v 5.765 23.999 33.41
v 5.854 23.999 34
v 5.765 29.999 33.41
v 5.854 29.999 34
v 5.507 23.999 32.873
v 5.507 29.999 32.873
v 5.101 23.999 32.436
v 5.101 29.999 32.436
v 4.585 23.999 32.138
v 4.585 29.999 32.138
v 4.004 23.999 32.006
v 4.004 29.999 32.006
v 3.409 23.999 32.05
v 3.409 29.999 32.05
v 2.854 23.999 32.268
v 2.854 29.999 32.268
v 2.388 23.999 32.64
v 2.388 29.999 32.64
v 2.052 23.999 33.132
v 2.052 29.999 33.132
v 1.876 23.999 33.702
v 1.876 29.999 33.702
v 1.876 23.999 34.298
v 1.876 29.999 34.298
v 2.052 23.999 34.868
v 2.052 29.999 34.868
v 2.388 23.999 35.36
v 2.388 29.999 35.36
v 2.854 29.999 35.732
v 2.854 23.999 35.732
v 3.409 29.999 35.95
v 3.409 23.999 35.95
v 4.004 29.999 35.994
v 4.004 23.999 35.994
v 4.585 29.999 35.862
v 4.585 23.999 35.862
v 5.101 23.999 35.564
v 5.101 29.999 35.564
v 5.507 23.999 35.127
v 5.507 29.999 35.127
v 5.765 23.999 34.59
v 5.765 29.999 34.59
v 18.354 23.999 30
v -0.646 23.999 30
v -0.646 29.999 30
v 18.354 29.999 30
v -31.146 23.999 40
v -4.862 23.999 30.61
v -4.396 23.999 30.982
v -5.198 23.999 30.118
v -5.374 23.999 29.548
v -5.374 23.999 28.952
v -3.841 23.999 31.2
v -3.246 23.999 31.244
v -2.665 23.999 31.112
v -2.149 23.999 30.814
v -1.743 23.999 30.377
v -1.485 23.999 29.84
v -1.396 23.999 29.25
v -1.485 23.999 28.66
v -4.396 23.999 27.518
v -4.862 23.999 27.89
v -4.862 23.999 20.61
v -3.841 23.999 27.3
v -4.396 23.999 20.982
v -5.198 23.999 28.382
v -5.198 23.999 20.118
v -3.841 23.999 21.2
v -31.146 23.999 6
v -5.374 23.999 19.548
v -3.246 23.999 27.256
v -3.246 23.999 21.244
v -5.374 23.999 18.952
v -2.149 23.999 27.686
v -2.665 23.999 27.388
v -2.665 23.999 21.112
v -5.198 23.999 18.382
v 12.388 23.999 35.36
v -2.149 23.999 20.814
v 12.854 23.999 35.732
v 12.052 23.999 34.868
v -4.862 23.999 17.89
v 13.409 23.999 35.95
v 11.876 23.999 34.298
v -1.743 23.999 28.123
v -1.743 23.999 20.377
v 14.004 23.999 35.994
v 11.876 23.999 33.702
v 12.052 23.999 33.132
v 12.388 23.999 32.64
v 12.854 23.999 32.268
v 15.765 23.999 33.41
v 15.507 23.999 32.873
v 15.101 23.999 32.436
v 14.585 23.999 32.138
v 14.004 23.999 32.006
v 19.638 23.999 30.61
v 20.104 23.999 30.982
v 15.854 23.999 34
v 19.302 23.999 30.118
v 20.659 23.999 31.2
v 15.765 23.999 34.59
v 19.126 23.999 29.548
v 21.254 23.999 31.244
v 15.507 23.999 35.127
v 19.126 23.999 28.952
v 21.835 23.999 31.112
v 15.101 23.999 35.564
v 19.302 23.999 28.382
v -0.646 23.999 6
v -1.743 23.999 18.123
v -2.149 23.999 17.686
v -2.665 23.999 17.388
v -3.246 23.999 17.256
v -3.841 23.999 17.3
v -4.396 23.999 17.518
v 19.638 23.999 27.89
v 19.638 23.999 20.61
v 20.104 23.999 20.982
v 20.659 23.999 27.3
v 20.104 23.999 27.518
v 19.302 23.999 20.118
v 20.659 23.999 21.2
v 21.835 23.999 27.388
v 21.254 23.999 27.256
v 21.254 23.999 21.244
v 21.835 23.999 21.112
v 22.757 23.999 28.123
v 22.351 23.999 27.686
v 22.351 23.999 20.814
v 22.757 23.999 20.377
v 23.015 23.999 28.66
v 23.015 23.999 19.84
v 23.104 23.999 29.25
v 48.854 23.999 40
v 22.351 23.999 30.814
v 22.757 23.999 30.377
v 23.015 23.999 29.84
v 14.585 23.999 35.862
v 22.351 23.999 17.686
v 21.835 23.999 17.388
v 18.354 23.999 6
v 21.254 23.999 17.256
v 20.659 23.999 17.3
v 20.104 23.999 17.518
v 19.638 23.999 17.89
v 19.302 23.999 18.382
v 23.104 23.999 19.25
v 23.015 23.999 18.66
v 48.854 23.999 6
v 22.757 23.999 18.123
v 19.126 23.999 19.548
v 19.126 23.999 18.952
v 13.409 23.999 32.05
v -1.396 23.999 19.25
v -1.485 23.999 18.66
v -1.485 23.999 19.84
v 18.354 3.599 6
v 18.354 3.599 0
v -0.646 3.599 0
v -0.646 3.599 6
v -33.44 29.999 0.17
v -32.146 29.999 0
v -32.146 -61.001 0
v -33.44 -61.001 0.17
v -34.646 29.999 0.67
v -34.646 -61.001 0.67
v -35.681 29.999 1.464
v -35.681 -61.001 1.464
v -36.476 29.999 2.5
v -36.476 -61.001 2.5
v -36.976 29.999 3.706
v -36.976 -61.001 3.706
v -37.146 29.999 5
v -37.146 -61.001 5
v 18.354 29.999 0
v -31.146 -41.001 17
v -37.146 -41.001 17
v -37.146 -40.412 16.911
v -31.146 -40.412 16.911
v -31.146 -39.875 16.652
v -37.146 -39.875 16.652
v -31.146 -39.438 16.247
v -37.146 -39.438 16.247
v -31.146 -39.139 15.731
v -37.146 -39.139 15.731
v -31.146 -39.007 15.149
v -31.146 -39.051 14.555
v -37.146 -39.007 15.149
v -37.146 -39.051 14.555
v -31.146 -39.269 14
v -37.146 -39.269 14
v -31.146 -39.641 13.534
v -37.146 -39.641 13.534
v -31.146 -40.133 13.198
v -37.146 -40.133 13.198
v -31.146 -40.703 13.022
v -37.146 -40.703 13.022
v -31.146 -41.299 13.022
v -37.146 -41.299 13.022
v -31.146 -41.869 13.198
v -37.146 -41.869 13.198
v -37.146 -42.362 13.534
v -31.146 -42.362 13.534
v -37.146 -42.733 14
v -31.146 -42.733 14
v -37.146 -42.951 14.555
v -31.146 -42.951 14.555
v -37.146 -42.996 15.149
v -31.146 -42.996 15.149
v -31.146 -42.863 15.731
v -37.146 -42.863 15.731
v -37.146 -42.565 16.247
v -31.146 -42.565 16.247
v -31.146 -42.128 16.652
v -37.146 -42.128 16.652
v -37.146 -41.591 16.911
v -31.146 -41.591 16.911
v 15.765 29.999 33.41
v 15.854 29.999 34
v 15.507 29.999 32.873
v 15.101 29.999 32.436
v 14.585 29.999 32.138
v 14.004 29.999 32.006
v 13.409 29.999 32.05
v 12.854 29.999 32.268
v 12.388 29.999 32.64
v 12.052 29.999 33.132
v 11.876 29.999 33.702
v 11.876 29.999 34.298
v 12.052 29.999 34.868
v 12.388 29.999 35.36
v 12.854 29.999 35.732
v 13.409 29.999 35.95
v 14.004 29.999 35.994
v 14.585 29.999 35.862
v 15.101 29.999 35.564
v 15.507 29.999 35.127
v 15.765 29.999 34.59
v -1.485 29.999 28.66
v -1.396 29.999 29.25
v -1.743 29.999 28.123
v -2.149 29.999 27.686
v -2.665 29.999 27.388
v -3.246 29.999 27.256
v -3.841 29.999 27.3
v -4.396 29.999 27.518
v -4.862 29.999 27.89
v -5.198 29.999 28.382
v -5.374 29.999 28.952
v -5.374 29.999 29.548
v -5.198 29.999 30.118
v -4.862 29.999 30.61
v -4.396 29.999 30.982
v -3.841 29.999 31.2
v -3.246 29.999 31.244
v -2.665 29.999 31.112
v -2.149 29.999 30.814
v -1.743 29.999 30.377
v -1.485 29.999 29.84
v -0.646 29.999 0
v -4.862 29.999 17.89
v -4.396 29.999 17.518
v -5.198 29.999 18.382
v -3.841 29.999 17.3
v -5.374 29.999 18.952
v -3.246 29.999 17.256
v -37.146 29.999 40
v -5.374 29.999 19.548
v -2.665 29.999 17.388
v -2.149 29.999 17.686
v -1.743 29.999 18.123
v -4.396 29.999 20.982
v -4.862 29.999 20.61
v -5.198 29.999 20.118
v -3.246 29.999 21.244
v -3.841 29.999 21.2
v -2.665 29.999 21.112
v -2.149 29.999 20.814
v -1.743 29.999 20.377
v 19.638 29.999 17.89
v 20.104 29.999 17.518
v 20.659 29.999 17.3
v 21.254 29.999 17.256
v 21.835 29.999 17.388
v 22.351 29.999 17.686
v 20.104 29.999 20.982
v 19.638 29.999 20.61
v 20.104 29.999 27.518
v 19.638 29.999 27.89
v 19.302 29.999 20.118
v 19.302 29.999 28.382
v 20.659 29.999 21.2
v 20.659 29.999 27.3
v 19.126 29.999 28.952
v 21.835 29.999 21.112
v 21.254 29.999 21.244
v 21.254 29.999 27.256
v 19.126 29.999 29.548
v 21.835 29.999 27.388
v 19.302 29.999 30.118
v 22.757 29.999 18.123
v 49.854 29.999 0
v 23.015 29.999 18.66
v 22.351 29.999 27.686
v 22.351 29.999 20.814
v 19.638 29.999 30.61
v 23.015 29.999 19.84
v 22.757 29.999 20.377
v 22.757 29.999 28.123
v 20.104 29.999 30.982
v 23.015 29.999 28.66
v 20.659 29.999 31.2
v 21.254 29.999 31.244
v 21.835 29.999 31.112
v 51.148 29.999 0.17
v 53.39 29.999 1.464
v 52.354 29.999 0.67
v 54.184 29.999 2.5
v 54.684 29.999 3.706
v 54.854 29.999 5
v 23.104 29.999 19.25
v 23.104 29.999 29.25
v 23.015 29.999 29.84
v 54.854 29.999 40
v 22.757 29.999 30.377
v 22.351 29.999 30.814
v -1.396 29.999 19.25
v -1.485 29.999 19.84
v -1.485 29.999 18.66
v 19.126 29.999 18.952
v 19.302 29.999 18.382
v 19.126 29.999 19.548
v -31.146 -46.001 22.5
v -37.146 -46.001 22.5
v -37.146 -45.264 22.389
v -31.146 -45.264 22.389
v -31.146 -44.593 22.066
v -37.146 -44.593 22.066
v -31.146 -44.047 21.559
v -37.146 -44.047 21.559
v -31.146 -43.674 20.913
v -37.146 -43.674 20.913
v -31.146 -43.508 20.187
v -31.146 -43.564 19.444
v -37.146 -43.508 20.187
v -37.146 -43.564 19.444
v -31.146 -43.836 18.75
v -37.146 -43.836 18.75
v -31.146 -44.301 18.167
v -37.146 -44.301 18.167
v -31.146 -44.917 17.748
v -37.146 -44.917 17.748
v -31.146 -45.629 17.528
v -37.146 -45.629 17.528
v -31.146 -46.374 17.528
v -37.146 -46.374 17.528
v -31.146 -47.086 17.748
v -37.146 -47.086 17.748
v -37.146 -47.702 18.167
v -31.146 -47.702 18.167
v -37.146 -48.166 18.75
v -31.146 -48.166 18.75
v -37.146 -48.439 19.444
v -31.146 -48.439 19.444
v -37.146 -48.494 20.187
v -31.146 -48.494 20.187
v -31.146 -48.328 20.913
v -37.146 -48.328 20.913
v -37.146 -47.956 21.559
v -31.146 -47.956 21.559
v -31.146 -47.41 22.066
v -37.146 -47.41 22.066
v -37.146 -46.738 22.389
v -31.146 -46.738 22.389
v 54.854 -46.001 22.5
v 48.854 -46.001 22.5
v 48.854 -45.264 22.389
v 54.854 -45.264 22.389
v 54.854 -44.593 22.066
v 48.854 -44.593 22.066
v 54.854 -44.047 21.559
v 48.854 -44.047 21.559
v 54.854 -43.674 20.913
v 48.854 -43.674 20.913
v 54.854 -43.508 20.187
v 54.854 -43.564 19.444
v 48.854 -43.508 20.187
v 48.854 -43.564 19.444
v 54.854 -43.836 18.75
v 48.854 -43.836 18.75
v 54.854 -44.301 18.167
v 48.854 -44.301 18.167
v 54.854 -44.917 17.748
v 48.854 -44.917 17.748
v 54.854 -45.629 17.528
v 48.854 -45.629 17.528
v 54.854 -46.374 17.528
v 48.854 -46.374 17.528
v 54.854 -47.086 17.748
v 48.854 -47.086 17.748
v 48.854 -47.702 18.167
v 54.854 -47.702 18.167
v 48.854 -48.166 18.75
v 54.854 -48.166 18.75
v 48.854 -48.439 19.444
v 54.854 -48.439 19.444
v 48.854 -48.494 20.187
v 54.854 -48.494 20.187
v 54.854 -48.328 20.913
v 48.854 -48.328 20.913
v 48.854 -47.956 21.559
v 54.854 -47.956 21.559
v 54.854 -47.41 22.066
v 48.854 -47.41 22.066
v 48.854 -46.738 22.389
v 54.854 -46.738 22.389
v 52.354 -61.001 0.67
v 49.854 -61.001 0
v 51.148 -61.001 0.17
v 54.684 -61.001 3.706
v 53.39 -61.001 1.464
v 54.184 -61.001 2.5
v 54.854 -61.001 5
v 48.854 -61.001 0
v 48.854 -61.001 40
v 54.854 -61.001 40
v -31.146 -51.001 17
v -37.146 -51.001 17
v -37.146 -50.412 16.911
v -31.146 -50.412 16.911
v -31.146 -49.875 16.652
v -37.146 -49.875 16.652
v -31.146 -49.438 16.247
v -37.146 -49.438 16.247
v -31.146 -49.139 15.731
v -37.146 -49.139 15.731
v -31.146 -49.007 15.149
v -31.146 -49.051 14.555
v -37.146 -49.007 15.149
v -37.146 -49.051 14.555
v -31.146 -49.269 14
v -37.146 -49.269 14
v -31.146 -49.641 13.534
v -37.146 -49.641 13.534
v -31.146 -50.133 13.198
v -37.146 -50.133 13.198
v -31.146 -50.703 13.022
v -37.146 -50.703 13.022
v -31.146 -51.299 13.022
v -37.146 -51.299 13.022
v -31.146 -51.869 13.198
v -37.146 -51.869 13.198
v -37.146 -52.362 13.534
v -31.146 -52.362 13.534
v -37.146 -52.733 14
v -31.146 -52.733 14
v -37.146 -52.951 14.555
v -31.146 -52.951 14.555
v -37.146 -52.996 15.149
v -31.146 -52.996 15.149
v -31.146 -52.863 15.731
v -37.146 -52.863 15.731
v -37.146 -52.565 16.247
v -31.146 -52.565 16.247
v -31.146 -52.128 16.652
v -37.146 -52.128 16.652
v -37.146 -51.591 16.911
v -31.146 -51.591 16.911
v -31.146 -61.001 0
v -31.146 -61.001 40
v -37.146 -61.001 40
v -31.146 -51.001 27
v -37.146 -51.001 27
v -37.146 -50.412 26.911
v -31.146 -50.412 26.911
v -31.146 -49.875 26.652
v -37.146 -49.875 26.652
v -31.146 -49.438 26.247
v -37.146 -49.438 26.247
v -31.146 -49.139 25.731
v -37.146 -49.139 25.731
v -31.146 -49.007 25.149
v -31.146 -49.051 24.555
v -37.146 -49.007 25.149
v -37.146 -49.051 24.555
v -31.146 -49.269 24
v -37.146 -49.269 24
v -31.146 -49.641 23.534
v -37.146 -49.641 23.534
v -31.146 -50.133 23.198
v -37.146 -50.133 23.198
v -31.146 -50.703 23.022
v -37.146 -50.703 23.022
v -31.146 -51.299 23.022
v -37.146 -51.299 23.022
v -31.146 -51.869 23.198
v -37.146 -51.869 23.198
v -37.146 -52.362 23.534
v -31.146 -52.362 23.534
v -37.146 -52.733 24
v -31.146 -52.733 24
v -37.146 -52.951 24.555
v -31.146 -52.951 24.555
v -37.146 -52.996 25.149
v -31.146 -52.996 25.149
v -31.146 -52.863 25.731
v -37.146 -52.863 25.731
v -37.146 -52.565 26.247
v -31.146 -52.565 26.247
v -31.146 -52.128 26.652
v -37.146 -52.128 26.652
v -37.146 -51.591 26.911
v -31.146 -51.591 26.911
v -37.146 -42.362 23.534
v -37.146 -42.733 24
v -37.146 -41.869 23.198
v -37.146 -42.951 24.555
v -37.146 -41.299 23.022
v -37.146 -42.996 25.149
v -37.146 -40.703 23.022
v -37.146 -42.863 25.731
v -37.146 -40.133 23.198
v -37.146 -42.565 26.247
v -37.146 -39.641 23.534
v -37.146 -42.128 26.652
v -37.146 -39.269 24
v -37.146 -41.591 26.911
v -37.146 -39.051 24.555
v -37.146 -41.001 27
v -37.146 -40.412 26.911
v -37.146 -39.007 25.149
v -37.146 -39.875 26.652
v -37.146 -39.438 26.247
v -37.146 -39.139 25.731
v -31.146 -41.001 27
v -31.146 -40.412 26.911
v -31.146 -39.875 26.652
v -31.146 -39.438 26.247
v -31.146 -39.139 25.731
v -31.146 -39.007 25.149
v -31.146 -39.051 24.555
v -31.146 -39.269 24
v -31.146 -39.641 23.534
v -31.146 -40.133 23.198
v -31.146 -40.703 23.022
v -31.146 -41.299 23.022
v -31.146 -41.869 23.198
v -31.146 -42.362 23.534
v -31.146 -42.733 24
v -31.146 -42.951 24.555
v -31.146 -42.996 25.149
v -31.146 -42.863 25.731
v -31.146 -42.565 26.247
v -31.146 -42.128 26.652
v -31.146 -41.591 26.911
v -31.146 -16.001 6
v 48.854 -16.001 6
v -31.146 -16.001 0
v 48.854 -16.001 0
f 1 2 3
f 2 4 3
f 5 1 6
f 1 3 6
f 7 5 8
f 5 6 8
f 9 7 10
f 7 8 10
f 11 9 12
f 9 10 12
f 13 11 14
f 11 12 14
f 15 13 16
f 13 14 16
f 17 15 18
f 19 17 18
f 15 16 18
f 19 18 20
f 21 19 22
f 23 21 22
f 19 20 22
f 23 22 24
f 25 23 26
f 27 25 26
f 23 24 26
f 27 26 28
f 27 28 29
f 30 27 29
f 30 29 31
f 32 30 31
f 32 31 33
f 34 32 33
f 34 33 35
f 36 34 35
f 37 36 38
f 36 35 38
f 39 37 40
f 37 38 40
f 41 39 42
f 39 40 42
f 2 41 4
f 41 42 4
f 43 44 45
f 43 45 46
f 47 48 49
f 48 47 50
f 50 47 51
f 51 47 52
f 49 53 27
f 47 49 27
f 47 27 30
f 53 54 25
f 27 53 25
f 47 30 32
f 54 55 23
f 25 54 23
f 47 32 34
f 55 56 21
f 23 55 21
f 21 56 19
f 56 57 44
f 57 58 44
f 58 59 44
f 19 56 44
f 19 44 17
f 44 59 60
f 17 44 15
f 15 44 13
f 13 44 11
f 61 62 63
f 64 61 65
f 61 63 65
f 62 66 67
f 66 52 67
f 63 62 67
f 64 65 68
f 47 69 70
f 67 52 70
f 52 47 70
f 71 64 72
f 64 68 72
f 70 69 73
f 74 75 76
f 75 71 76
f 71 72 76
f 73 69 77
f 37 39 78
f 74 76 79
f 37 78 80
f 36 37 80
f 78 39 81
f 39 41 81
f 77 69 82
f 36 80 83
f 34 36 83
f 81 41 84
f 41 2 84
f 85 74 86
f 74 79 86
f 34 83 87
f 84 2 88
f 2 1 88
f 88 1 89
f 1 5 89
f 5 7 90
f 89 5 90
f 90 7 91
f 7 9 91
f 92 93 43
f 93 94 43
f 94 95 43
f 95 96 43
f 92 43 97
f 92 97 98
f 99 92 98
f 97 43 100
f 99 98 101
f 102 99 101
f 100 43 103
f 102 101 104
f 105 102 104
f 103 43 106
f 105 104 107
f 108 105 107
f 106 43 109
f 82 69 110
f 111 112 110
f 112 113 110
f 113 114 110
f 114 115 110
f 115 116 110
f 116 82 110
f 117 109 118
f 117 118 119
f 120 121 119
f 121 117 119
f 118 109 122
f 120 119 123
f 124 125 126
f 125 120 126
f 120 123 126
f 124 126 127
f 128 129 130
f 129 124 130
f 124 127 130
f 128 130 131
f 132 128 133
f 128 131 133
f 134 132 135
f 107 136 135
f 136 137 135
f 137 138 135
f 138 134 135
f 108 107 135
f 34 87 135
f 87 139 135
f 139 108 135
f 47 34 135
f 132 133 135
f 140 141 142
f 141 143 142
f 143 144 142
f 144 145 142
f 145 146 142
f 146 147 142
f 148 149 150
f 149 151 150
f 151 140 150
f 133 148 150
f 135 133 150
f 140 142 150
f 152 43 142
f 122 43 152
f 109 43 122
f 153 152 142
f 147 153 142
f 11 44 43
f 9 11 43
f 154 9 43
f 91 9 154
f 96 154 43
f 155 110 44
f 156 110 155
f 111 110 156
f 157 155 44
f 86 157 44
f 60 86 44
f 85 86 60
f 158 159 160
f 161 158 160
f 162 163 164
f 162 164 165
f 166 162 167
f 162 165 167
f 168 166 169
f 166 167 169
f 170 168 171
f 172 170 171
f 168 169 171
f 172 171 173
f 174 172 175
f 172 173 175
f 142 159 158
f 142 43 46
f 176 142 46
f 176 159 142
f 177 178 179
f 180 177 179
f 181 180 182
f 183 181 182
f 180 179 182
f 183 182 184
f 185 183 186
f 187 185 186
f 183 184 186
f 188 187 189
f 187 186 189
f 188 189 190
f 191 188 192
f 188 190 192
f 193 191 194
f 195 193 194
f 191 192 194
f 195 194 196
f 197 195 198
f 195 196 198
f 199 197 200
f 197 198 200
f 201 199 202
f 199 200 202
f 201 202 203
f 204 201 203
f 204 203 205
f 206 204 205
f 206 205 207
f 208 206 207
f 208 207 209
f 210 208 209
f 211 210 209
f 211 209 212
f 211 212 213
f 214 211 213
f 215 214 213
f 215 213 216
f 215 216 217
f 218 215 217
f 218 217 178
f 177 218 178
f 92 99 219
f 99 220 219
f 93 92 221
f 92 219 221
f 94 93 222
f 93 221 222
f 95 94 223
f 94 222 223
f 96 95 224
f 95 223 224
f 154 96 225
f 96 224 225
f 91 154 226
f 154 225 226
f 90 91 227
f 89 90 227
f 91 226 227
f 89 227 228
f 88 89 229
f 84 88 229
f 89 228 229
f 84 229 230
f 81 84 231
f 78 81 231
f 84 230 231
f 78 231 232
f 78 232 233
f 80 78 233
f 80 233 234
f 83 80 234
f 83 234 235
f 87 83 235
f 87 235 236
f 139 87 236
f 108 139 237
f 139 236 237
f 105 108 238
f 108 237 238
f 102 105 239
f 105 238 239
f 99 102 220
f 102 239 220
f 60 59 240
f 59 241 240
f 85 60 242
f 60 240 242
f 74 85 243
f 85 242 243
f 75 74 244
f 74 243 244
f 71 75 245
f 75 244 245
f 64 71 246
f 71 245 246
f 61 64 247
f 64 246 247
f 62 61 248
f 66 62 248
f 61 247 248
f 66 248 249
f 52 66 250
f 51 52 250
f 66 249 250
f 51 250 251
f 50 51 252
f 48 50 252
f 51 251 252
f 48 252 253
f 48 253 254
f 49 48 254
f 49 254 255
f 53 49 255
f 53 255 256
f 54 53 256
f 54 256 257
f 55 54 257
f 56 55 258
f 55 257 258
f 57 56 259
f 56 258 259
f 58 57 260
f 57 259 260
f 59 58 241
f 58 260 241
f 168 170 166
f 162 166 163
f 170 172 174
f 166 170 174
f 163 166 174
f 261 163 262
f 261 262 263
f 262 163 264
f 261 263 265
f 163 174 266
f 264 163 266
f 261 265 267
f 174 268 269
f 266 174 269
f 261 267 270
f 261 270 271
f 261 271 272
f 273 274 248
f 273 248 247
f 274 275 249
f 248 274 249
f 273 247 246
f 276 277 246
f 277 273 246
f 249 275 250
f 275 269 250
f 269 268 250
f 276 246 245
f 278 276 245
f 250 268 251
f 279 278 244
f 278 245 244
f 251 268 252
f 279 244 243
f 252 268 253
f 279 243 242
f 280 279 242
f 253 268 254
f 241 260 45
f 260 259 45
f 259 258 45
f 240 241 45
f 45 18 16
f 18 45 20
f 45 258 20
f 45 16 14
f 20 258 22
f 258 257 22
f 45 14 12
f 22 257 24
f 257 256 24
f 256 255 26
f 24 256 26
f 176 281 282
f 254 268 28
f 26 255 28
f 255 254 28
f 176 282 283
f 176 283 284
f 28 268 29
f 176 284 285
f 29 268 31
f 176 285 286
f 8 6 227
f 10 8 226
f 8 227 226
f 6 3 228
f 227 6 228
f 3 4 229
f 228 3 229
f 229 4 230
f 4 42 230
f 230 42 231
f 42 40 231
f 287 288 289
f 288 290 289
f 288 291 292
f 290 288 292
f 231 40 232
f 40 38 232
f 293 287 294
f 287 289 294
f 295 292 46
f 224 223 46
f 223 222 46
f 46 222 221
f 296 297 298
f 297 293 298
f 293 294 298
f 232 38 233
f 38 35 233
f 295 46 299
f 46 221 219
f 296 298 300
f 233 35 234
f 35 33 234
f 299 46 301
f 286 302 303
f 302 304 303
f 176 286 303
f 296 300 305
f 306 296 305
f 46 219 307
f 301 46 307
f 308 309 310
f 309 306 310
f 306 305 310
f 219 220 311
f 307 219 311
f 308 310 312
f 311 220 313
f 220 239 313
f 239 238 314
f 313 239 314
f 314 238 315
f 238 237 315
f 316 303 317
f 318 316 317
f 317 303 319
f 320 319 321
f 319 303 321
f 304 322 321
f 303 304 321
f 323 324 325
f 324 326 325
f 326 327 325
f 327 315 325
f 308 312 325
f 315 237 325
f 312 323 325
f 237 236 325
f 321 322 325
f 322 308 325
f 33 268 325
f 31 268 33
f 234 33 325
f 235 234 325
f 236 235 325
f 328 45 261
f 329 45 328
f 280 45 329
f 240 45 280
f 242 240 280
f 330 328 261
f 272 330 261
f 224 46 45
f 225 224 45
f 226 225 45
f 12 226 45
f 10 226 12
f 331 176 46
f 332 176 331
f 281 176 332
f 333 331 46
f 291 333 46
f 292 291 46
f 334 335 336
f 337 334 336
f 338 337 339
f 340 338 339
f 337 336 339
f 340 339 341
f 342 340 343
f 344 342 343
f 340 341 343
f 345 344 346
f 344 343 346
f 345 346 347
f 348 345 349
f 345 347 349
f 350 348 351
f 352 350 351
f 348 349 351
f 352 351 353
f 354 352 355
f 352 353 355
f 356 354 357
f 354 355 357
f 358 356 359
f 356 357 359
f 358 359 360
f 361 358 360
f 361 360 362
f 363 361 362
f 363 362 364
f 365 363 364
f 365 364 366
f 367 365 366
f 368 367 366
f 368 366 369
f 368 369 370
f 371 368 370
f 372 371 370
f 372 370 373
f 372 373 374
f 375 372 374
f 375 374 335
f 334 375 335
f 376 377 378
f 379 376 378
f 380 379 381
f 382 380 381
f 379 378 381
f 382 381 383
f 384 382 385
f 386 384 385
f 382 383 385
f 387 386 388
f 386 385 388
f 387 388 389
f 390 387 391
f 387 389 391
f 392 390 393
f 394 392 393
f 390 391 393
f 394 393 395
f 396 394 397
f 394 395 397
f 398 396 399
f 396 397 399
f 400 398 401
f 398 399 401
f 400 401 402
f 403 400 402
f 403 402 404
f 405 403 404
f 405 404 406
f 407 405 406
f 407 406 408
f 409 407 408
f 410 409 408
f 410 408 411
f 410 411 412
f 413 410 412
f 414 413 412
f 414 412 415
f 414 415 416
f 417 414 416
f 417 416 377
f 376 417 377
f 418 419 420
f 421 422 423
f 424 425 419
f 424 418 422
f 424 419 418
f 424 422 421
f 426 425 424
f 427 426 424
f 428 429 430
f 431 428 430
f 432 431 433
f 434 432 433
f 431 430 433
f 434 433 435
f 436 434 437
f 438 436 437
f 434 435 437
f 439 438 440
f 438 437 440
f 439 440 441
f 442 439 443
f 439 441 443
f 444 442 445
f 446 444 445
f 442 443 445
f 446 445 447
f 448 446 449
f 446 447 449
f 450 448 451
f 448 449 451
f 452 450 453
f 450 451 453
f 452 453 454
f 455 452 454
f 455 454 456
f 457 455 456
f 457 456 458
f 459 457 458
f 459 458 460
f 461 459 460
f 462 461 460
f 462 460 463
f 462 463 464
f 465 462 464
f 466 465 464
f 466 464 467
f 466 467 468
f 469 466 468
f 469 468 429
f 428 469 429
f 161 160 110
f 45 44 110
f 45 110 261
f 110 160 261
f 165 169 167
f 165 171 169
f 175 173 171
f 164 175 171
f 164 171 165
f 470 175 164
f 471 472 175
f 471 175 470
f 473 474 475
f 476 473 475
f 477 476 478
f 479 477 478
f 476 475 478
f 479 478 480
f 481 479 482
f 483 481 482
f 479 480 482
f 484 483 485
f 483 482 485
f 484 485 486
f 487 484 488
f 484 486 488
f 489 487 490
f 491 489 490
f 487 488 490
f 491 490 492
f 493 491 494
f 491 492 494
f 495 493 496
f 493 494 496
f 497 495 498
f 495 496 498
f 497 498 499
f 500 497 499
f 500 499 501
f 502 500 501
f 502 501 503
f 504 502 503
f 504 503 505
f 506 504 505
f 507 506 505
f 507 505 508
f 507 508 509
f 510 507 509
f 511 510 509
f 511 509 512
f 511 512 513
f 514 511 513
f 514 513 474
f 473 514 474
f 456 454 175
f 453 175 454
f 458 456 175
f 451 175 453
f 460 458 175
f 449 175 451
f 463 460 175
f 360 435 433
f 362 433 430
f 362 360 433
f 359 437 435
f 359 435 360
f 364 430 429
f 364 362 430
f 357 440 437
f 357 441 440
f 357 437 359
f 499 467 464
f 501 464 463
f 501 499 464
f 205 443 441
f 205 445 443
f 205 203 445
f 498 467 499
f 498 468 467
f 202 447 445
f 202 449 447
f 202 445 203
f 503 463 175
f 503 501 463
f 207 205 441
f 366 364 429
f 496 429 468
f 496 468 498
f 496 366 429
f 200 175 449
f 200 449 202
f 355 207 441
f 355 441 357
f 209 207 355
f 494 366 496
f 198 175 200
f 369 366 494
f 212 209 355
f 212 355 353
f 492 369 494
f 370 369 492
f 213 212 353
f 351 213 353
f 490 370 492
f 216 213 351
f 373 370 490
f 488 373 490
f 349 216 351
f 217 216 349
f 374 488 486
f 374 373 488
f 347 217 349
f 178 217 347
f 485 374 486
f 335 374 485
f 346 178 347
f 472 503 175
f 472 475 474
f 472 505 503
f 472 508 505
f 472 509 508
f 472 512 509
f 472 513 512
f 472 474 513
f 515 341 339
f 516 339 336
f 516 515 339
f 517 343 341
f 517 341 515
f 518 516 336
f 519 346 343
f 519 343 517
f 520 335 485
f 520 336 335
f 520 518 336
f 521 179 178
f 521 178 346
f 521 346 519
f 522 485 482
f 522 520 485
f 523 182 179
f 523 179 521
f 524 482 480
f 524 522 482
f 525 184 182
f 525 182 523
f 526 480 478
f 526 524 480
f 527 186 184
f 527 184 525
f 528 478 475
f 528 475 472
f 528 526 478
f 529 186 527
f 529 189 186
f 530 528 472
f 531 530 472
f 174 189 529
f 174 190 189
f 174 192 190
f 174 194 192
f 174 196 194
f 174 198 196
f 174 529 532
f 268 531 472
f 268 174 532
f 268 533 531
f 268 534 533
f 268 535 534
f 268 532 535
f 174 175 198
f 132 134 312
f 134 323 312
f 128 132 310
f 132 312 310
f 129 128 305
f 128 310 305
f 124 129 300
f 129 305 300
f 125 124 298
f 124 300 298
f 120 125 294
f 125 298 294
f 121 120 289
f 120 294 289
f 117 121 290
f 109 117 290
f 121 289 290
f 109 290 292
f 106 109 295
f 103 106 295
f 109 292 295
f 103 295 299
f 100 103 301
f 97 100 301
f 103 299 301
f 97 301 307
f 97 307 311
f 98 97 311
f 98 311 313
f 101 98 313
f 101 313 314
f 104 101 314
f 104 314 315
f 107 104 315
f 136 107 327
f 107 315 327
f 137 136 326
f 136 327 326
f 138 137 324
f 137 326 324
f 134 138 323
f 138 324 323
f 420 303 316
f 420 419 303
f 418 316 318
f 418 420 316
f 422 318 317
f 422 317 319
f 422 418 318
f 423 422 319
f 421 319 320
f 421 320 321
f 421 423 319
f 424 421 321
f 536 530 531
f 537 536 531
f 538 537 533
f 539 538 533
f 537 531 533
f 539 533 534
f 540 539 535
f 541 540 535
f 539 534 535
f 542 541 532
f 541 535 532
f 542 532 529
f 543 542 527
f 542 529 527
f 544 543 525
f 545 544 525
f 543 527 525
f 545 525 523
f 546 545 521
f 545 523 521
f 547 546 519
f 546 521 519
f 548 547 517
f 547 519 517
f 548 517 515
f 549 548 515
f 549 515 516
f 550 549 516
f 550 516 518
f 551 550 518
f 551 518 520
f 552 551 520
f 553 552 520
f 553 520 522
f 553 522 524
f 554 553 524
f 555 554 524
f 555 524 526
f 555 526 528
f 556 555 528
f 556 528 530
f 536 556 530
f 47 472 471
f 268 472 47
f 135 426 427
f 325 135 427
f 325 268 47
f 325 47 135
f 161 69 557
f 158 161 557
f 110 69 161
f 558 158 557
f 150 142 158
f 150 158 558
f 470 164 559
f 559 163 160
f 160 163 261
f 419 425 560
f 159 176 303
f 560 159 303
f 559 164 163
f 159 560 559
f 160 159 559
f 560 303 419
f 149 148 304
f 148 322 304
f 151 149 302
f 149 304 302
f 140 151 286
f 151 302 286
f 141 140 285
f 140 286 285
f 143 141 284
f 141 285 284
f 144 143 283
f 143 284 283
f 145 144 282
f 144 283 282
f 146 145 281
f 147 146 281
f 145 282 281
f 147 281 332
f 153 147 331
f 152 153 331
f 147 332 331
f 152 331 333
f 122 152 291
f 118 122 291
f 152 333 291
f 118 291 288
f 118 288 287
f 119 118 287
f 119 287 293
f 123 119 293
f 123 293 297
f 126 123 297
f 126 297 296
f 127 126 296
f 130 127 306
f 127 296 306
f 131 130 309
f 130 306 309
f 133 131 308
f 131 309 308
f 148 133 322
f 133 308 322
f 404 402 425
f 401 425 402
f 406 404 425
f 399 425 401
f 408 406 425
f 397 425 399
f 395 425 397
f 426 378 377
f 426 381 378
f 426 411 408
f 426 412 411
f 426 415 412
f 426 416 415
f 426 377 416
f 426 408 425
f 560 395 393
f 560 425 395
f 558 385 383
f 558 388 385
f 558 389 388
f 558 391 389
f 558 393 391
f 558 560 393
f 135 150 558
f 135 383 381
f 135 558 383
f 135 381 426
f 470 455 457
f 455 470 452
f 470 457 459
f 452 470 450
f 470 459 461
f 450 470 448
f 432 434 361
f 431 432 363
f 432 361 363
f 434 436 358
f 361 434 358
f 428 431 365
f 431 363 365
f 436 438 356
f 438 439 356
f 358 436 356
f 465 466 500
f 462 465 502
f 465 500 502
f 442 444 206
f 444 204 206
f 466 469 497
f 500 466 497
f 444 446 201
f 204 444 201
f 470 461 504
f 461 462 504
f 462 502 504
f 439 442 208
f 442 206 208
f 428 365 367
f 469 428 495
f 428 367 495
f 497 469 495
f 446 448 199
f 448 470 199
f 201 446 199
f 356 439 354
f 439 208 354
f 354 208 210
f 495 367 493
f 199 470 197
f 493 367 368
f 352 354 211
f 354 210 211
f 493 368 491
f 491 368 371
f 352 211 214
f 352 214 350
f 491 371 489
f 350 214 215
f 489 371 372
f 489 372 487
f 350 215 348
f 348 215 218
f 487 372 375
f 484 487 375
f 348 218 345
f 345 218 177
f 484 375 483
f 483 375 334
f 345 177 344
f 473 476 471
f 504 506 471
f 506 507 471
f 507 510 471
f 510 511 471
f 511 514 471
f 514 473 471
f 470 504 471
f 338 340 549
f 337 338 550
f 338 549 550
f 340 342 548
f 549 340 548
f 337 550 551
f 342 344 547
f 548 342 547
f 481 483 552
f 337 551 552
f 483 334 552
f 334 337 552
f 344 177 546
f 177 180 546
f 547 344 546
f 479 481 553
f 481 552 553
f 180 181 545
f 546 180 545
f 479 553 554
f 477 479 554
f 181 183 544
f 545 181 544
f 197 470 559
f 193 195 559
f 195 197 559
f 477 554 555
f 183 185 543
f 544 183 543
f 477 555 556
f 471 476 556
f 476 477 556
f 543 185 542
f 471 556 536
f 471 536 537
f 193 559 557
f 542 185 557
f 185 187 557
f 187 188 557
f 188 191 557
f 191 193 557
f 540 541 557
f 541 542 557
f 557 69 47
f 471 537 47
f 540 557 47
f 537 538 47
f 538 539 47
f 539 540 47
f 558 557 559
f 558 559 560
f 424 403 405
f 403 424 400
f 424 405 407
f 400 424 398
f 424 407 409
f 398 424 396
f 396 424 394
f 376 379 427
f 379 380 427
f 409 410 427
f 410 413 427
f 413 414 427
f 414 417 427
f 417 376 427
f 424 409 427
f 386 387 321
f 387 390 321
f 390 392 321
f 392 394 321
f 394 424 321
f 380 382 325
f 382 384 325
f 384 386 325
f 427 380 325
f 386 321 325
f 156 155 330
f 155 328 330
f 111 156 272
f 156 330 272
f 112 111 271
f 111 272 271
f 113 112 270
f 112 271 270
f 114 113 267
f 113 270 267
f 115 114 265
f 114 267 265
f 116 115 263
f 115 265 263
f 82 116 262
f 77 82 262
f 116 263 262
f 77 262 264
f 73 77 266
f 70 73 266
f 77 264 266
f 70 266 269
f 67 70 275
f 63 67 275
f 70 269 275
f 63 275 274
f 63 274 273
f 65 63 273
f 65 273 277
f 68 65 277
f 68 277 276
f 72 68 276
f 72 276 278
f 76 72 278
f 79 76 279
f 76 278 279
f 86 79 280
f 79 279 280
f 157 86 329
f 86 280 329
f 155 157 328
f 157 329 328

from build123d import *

# Parameters (mm, degrees)
SALIENTE_EXTRUIR1_DEPTH    = 40
CROQUIS5_W                 = 40
CROQUIS5_H                 = 10
CORTAR_EXTRUIR2_DEPTH      = 40
SALIENTE_EXTRUIR2_DEPTH    = 40
CROQUIS6_R                 = 2
CROQUIS6_W                 = 19
CROQUIS6_H                 = 42
CORTAR_EXTRUIR3_DEPTH      = 3
CORTAR_EXTRUIR3_DEPTH_BACK = 40
CROQUIS9_W                 = 6
CROQUIS9_H                 = 40
SALIENTE_EXTRUIR3_DEPTH    = 60
CROQUIS10_W                = 6
CROQUIS10_H                = 40
SALIENTE_EXTRUIR4_DEPTH    = 50
CROQUIS11_R                = 2.5
CORTAR_EXTRUIR4_DEPTH      = 1
CORTAR_EXTRUIR4_DEPTH_BACK = 93
CROQUIS12_W                = 80
CROQUIS12_H                = 6
SALIENTE_EXTRUIR5_DEPTH    = 40
CROQUIS13_W                = 19
CROQUIS13_H                = 20.4
CORTAR_EXTRUIR5_DEPTH      = 40
CROQUIS14_R                = 2
CROQUIS14_R_2              = 2.5
CORTAR_EXTRUIR6_DEPTH      = 40
REDONDEO3_R                = 5


with BuildPart() as part:
    # Croquis2 → Saliente-Extruir1 (new body)
    with BuildSketch(Plane.XY):
        Polygon((-31.145916957, -11.001243781), (-31.145916957, 23.998756219), (48.854083043, 23.998756219), (48.854083043, -11.001243781), (52.854083043, -11.001243781), (52.854083043, 27.998756219), (-35.145916957, 27.998756219), (-35.145916957, -11.001243781), align=None)
    extrude(amount=SALIENTE_EXTRUIR1_DEPTH)

    # Croquis5 → Cortar-Extruir2 (cut)
    with BuildSketch(Plane.ZY.offset(35.145916957)):
        with Locations((20, -6.001243781)):
            Rectangle(CROQUIS5_W, CROQUIS5_H)
    extrude(amount=-CORTAR_EXTRUIR2_DEPTH, mode=Mode.SUBTRACT)

    # Croquis7 → Saliente-Extruir2 (add)
    with BuildSketch(Plane.XY.offset(40)):
        Polygon((-35.145916957, -1.001243781), (-37.145916957, -1.001243781), (-37.145916957, 29.998756219), (54.854083043, 29.998756219), (54.854083043, -11.001243781), (52.854083043, -11.001243781), (52.854083043, 27.998756219), (-35.145916957, 27.998756219), align=None)
    extrude(amount=-SALIENTE_EXTRUIR2_DEPTH)

    # Croquis6 → Cortar-Extruir3 (cut, two sides)
    with BuildSketch(Plane(origin=(0, 27.998756219, 0), x_dir=(1, 0, 0), z_dir=(0, 1, 0))) as cortar_extruir3_sk:
        with Locations((13.854083043, -34)):
            Circle(CROQUIS6_R)
        with Locations((3.854083043, -34)):
            Circle(CROQUIS6_R)
        with Locations((-3.395916957, -29.25)):
            Circle(CROQUIS6_R)
        with Locations((-3.395916957, -19.25)):
            Circle(CROQUIS6_R)
        with Locations((21.104083043, -19.25)):
            Circle(CROQUIS6_R)
        with Locations((21.104083043, -29.25)):
            Circle(CROQUIS6_R)
        with Locations((8.854083043, -9)):
            Rectangle(CROQUIS6_W, CROQUIS6_H)
    extrude(amount=CORTAR_EXTRUIR3_DEPTH, mode=Mode.SUBTRACT)
    extrude(cortar_extruir3_sk.sketch, amount=-CORTAR_EXTRUIR3_DEPTH_BACK, mode=Mode.SUBTRACT)

    # Croquis9 → Saliente-Extruir3 (add)
    with BuildSketch(Plane.XZ.offset(1.001243781)):
        with Locations((-34.145916957, 20)):
            Rectangle(CROQUIS9_W, CROQUIS9_H)
    extrude(amount=SALIENTE_EXTRUIR3_DEPTH)

    # Croquis10 → Saliente-Extruir4 (add)
    with BuildSketch(Plane.XZ.offset(11.001243781)):
        with Locations((51.854083043, 20)):
            Rectangle(CROQUIS10_W, CROQUIS10_H)
    extrude(amount=SALIENTE_EXTRUIR4_DEPTH)

    # Croquis11 → Cortar-Extruir4 (cut, two sides)
    with BuildSketch(Plane.ZY.offset(37.145916957)) as cortar_extruir4_sk:
        with Locations((20, -46.001243781)):
            Circle(CROQUIS11_R)
    extrude(amount=CORTAR_EXTRUIR4_DEPTH, mode=Mode.SUBTRACT)
    extrude(cortar_extruir4_sk.sketch, amount=-CORTAR_EXTRUIR4_DEPTH_BACK, mode=Mode.SUBTRACT)

    # Croquis12 → Saliente-Extruir5 (add)
    with BuildSketch(Plane.XZ.offset(-23.998756219)):
        with Locations((8.854083043, 3)):
            Rectangle(CROQUIS12_W, CROQUIS12_H)
    extrude(amount=SALIENTE_EXTRUIR5_DEPTH)

    # Croquis13 → Cortar-Extruir5 (cut)
    with BuildSketch(Plane(origin=(0, 0, 0), x_dir=(-1, 0, 0), z_dir=(0, 0, -1))):
        with Locations((-8.854083043, 13.798756219)):
            Rectangle(CROQUIS13_W, CROQUIS13_H)
    extrude(amount=-CORTAR_EXTRUIR5_DEPTH, mode=Mode.SUBTRACT)

    # Croquis14 → Cortar-Extruir6 (cut)
    with BuildSketch(Plane.ZY.offset(37.145916957)):
        with Locations((25, -51.001243781)):
            Circle(CROQUIS14_R)
        with Locations((25, -41.001243781)):
            Circle(CROQUIS14_R)
        with Locations((15, -51.001243781)):
            Circle(CROQUIS14_R)
        with Locations((15, -41.001243781)):
            Circle(CROQUIS14_R)
        with Locations((20, -46.001243781)):
            Circle(CROQUIS14_R_2)
    extrude(amount=-CORTAR_EXTRUIR6_DEPTH, mode=Mode.SUBTRACT)

    # Redondeo3
    redondeo3_edges = [part.edges().sort_by_distance(p)[0] for p in [
        (-37.145916957, -15.501243781, 0),
        (54.854083043, -15.501243781, 0),
    ]]
    fillet(redondeo3_edges, radius=REDONDEO3_R)


solid = part.part
